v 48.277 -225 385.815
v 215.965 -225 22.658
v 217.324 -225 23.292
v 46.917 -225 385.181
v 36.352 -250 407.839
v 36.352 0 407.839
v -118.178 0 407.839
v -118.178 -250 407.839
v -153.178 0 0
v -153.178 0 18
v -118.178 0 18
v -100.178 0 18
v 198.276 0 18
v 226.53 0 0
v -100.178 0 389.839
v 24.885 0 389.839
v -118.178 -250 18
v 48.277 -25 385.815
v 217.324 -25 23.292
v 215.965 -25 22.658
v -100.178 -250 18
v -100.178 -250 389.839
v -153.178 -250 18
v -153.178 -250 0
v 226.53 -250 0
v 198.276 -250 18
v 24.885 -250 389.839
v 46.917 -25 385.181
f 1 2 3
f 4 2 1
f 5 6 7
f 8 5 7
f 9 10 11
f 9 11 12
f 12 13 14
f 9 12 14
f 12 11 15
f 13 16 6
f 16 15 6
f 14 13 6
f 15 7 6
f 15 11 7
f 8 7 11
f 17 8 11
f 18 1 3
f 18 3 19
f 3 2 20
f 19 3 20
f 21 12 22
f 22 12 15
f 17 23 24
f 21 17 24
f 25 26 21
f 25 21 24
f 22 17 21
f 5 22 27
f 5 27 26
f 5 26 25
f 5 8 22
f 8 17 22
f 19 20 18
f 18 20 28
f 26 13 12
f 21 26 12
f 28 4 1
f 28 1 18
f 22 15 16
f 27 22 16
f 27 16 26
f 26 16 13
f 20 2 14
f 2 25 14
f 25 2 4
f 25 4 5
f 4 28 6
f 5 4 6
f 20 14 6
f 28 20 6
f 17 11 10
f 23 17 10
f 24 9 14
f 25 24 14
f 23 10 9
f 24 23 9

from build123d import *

# Parameters (mm, degrees)
F1_DEPTH = 250
F3_DEPTH = 250.001
F4_W     = 200
F4_H     = 400
F5_DEPTH = 1.5


with BuildPart() as f1:
    # F0 (on Front) → F1 (new body)
    with BuildSketch(Plane.XZ):
        Polygon((-153.1775129723, 18), (-153.1775129723, 0), (226.53011856, 0), (36.3519007767, 407.8385041665), (-118.1775129723, 407.8385041665), (-118.1775129723, 18), align=None)
    extrude(amount=F1_DEPTH)

    # F2 (on face) → F3 (cut, through all)
    with BuildSketch(Plane(origin=(0, 0, 0), x_dir=(-1, 0, 0), z_dir=(0, 1, 0))):
        Polygon((-198.2757781719, 18), (100.1775129723, 18), (100.1775129723, 389.8385041665), (-24.8846360822, 389.8385041665), align=None)
    extrude(amount=-F3_DEPTH, mode=Mode.SUBTRACT)

    # F4 (on face) → F5 (join)
    with BuildSketch(Plane(origin=(186.0704359956, 0, 86.766069261), x_dir=(0, 1, 0), z_dir=(0.906307787, 0, 0.4226182617))):
        with Locations((-125, 129.2642350622)):
            Rectangle(F4_W, F4_H)
    extrude(amount=F5_DEPTH)


solid = f1.part
